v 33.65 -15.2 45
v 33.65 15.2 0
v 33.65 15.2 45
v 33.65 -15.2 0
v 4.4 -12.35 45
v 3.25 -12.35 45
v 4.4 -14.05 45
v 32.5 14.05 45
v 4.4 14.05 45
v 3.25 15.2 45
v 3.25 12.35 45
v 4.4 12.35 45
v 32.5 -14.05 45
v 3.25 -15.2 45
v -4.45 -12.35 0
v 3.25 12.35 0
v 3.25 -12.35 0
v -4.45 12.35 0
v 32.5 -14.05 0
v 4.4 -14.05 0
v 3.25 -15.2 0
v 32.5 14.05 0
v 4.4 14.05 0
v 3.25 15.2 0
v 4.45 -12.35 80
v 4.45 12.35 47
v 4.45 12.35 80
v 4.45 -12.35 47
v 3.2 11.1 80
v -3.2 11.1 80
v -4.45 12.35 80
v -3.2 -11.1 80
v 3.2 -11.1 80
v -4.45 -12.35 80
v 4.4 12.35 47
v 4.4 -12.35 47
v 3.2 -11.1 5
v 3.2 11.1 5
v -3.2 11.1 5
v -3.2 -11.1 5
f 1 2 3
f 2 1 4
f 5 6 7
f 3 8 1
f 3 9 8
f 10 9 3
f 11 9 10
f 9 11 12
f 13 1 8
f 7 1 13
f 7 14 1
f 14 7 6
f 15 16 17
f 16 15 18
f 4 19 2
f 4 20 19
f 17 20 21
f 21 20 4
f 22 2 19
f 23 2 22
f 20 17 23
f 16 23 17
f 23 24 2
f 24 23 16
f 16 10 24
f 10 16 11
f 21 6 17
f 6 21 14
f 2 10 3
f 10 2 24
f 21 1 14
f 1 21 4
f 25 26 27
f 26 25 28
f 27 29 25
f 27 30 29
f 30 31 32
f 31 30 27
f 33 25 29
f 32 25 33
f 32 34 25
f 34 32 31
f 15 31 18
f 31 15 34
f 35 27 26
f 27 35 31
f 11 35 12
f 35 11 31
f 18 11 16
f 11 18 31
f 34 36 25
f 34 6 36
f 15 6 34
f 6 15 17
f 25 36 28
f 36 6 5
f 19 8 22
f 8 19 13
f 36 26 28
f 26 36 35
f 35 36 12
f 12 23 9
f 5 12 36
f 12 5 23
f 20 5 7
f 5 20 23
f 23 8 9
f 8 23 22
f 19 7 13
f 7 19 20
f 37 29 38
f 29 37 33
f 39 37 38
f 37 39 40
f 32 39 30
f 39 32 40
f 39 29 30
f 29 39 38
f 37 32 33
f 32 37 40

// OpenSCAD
// file: BOSL2/std.scad
// Minimal BOSL2 compatibility shim for bundled gallery models.
// It implements only the helpers used by the imported OpenSCAD projects.

CENTER = [0, 0, 0];
BOTTOM = [0, 0, -1];
TOP = [0, 0, 1];
LEFT = [-1, 0, 0];
RIGHT = [1, 0, 0];
FRONT = [0, -1, 0];
BACK = [0, 1, 0];

module up(z=0) {
    translate([0, 0, z]) children();
}

module down(z=0) {
    translate([0, 0, -z]) children();
}

module attach(anchor=CENTER) {
    children();
}

module cuboid(size=[1, 1, 1], anchor=CENTER) {
    center = anchor == CENTER;
    translate(center ? [0, 0, 0] : [0, 0, size[2] / 2])
        cube(size, center=true);
    children();
}

module xcyl(h=1, r=1, anchor=CENTER) {
    center = anchor == CENTER;
    translate(center ? [0, 0, 0] : [h / 2, 0, 0])
        rotate([0, 90, 0])
            cylinder(h=h, r=r, center=true);
}
// main file
include <BOSL2/std.scad>
$fn=128;

difference()
{
union() 
{
     translate ([18.45, 0, 0])
            cuboid([30.4,30.4,45], anchor=BOTTOM, rounding=2, except=BOTTOM);
     cuboid([8.9, 24.7, 80], anchor=BOTTOM, rounding=1, except=BOTTOM);
} 
     translate ([18.45, 0, 0])
            cuboid([28.1,28.1,47], anchor=BOTTOM);
     translate([0,0,5]) cuboid ([6.4, 22.2, 82], anchor=BOTTOM);
}
